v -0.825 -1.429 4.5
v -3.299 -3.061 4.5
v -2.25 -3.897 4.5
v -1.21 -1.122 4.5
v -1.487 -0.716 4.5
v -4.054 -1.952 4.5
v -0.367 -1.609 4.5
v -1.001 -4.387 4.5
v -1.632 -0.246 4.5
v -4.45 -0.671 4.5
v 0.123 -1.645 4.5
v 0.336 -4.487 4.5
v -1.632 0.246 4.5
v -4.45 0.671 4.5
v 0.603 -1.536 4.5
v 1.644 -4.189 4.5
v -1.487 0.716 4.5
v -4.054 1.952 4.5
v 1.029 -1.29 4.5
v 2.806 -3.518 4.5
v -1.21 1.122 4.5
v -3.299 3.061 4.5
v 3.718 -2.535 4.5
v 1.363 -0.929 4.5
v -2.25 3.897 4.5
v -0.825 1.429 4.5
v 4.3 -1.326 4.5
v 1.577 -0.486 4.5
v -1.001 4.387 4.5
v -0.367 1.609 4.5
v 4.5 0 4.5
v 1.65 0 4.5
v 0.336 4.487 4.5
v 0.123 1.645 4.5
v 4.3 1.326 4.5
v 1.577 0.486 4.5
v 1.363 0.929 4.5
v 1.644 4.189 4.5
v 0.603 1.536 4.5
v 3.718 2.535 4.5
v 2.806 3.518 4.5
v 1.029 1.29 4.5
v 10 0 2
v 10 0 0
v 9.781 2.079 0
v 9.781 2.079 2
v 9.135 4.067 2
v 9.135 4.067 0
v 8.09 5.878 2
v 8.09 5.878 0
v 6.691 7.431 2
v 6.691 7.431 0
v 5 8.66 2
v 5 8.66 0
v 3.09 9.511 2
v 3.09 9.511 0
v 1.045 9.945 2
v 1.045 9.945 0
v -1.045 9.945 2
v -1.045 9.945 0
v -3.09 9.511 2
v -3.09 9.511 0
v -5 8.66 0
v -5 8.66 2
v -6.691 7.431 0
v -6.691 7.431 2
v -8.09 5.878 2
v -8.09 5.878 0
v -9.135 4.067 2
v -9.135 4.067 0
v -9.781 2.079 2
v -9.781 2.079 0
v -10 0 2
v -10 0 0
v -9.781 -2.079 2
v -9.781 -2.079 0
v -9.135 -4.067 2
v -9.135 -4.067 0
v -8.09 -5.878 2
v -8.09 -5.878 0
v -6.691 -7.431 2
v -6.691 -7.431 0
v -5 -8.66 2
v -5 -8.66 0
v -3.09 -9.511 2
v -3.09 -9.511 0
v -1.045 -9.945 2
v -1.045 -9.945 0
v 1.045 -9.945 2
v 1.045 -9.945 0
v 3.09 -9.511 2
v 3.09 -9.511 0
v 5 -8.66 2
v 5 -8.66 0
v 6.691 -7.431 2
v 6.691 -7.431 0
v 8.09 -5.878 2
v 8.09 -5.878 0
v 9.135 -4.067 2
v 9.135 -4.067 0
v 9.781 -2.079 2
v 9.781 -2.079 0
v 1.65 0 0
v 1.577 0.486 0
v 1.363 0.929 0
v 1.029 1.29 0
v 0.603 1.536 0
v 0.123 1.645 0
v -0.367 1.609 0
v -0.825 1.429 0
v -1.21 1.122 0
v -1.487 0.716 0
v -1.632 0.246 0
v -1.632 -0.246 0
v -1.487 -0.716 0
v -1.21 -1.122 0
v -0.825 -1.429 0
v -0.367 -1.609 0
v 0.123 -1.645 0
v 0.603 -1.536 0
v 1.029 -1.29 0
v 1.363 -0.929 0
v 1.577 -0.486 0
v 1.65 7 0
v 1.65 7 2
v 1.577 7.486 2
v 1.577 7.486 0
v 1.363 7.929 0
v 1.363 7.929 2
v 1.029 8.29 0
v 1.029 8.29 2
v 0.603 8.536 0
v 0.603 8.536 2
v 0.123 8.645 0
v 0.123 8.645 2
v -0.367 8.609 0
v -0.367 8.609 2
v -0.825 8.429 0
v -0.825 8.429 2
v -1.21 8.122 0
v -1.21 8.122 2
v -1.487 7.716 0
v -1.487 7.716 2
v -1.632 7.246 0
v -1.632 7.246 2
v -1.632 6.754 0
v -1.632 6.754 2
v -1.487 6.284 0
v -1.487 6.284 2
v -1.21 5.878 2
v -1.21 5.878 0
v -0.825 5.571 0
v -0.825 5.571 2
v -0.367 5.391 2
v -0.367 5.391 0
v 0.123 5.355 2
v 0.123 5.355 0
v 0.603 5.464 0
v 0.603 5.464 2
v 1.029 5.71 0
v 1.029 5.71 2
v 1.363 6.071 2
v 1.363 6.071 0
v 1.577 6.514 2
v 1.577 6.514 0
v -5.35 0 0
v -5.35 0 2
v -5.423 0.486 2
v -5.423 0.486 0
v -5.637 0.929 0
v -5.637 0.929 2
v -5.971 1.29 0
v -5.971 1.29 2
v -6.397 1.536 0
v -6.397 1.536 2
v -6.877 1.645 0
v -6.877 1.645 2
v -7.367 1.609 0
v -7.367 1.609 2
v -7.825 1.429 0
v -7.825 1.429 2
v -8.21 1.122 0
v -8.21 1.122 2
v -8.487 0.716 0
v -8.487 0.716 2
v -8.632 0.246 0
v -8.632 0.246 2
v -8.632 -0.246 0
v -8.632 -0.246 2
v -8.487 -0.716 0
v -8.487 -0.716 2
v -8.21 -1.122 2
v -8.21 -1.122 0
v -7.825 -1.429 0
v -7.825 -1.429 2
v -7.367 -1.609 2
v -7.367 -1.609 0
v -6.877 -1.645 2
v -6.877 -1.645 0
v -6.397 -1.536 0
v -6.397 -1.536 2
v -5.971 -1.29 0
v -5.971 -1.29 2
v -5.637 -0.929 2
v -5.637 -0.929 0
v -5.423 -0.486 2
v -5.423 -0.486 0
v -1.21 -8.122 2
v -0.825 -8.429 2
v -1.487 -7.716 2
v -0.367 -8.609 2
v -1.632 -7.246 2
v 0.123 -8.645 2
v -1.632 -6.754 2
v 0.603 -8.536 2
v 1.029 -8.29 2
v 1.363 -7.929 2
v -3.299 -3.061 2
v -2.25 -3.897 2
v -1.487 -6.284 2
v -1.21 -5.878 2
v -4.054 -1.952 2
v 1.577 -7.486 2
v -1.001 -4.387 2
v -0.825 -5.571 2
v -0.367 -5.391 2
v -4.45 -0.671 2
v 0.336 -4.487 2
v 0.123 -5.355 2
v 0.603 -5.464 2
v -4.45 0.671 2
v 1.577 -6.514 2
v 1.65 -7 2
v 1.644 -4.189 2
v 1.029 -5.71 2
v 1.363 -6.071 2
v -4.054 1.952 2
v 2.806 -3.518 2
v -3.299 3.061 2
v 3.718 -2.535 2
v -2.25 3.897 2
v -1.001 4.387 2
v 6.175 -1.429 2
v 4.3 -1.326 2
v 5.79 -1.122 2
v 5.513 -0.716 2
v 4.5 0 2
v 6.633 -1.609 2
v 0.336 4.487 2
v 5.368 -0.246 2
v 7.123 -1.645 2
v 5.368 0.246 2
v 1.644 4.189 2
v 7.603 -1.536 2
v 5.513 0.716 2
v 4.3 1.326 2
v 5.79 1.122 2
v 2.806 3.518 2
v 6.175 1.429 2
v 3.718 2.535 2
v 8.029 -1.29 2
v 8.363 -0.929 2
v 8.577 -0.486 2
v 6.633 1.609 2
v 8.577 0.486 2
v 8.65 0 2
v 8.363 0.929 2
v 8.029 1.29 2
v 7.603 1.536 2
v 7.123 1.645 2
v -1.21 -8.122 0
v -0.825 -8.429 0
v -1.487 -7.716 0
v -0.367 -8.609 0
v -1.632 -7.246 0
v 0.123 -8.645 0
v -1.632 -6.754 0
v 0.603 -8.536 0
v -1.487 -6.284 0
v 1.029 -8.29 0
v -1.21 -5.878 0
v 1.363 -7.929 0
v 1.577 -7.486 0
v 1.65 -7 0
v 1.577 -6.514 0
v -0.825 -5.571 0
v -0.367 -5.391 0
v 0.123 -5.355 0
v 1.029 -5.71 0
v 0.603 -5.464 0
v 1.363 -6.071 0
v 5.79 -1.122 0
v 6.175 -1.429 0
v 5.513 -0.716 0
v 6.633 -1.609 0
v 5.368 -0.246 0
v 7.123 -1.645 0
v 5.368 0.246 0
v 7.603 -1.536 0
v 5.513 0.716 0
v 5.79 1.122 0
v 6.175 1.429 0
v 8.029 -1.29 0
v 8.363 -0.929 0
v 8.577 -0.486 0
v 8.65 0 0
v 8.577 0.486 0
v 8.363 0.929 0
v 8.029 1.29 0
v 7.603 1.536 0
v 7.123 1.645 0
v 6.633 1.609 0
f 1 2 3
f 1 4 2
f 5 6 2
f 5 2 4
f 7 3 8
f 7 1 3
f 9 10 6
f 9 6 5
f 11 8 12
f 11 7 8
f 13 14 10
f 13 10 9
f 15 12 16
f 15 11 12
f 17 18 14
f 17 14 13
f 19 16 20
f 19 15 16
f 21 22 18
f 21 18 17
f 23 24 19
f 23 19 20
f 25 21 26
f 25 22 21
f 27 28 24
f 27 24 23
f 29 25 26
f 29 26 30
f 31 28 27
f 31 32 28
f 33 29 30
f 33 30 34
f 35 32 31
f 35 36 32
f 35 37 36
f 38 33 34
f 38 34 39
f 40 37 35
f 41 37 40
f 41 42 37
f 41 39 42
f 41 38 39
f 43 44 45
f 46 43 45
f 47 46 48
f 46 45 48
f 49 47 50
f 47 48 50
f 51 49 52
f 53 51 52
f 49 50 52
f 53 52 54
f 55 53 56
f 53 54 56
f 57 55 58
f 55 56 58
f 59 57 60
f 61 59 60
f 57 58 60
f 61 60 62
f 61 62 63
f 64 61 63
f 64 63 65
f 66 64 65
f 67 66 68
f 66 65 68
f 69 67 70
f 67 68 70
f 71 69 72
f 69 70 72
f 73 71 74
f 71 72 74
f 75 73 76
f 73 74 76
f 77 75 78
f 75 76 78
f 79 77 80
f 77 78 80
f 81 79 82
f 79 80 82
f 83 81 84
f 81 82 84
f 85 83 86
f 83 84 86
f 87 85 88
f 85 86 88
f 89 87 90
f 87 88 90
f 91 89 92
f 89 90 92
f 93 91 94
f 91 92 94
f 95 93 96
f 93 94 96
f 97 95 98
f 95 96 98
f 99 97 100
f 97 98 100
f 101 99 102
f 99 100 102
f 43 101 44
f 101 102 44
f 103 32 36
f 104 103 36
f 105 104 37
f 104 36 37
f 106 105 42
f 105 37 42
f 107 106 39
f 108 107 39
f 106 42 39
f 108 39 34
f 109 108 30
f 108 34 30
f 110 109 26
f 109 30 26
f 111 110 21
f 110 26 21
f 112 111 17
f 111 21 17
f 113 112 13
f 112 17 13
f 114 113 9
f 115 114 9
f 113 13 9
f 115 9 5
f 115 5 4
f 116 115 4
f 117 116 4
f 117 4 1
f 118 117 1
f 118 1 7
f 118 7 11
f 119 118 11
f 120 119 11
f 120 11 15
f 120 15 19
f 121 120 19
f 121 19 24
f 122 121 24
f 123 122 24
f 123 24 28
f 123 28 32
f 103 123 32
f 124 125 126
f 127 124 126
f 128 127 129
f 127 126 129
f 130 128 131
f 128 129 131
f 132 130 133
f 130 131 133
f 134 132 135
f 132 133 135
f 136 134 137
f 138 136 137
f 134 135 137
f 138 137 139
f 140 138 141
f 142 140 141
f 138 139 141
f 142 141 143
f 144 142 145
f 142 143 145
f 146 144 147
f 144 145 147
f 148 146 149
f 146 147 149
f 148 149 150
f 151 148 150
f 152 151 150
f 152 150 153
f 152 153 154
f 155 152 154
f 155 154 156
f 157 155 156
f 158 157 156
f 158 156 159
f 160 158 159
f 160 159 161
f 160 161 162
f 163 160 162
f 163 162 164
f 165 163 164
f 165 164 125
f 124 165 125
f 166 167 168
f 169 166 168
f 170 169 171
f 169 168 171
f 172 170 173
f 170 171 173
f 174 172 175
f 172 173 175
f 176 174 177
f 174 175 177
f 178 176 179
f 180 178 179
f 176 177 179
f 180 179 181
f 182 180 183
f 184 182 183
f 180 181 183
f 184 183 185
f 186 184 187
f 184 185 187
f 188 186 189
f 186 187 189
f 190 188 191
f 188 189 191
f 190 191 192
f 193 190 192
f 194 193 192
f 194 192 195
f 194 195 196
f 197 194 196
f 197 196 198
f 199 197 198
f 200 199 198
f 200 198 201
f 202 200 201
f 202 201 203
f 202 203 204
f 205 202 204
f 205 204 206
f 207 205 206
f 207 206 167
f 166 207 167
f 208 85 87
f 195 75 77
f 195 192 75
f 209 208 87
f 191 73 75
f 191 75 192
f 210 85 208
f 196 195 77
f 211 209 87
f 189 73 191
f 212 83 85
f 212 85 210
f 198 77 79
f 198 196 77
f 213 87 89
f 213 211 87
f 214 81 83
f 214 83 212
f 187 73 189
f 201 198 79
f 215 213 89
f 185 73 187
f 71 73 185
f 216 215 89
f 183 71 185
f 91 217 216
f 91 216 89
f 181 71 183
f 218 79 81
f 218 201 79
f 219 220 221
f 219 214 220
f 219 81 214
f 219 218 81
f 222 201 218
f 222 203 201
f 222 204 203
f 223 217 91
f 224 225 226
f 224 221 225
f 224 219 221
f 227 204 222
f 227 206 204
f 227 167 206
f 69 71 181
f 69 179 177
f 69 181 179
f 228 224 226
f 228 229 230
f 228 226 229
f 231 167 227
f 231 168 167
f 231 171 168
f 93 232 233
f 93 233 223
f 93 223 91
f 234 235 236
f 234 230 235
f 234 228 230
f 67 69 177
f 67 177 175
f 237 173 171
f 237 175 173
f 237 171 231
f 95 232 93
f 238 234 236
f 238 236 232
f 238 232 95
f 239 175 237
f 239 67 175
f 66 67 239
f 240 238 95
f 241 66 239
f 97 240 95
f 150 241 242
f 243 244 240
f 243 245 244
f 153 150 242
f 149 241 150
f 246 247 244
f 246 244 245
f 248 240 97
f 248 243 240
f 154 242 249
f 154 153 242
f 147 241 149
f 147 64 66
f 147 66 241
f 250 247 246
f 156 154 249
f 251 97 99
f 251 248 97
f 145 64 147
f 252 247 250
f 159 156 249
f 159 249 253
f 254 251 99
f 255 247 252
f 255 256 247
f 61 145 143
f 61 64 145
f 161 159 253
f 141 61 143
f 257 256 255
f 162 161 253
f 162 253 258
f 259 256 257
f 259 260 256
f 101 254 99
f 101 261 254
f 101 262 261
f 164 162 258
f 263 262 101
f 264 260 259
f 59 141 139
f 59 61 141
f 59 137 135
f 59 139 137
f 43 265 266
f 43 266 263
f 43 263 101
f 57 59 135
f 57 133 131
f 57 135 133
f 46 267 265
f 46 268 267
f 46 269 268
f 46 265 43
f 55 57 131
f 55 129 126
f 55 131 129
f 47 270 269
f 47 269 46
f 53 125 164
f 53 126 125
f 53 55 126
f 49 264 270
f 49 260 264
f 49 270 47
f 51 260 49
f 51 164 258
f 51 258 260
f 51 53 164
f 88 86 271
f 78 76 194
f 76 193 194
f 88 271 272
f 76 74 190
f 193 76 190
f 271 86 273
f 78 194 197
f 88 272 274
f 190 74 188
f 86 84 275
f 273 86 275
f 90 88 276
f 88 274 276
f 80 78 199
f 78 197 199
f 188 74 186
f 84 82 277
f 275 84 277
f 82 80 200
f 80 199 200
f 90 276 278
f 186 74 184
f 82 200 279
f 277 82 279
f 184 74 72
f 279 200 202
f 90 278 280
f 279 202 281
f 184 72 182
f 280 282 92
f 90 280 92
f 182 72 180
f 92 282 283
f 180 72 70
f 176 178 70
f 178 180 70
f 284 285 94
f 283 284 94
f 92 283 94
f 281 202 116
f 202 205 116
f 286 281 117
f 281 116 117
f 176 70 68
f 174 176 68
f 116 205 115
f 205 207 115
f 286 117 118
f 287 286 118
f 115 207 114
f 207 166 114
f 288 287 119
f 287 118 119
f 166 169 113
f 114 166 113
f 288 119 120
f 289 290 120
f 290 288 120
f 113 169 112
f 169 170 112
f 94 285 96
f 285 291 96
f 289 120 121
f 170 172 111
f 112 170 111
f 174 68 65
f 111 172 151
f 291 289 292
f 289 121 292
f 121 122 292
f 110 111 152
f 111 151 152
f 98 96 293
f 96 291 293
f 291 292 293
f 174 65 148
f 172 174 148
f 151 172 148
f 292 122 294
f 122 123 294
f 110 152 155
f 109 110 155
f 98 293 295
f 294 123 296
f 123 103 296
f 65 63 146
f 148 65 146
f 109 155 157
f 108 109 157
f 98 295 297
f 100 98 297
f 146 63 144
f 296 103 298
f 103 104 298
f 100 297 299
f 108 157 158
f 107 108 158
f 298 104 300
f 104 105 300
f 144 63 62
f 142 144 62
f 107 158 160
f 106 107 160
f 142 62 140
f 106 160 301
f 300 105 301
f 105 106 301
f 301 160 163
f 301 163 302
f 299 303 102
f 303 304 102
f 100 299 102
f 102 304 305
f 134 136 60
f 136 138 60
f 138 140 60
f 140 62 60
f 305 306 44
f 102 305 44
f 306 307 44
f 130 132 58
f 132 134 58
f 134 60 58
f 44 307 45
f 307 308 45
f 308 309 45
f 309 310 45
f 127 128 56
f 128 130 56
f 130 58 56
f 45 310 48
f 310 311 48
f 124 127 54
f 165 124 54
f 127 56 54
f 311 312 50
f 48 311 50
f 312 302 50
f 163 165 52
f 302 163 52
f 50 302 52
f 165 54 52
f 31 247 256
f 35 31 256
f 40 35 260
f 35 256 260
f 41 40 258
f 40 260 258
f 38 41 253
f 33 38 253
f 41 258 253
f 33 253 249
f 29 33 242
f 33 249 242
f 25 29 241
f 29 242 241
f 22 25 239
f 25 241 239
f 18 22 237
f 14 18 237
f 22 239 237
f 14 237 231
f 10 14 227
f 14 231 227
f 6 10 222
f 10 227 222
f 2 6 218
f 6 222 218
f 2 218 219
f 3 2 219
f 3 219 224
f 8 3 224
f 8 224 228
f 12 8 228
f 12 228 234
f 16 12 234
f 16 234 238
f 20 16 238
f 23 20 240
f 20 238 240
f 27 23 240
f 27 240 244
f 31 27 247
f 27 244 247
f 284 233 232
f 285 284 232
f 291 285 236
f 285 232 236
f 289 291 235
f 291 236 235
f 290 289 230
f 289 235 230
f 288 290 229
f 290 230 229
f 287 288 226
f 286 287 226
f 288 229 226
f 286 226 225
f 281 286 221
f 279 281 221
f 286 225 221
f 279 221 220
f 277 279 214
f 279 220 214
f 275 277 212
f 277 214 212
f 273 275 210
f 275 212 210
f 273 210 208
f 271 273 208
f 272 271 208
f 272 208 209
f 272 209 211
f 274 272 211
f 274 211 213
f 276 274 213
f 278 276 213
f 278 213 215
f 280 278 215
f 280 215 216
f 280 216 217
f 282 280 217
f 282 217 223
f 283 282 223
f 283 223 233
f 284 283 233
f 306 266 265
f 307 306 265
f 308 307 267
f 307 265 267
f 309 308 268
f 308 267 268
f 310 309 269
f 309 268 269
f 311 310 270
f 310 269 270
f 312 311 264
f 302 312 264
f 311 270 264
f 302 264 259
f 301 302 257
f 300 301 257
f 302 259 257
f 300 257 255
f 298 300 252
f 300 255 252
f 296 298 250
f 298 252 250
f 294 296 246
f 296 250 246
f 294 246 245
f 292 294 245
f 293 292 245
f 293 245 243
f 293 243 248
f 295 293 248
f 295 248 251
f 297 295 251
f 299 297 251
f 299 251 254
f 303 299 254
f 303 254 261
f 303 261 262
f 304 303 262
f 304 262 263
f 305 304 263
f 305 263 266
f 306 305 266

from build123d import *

# Parameters (mm, degrees)
SKETCH_1_R          = 10
EXTRUDE_1_DEPTH     = 2
SKETCH_2_R          = 4.5
EXTRUDE_2_DEPTH     = 2.5
SKETCH_3_R          = 1.65
CUT_EXTRUDE_1_DEPTH = 8.5
SKETCH_4_R          = 1.65
CUT_EXTRUDE_2_DEPTH = 8.5


with BuildPart() as part:
    # 草图1 → 凸台-拉伸1 (new body)
    with BuildSketch(Plane.XY):
        Circle(SKETCH_1_R)
    extrude(amount=EXTRUDE_1_DEPTH)

    # 草图2 → 凸台-拉伸2 (add)
    with BuildSketch(Plane.XY.offset(2)):
        Circle(SKETCH_2_R)
    extrude(amount=EXTRUDE_2_DEPTH)

    # 草图3 → 切除-拉伸1 (cut)
    with BuildSketch(Plane.XY.offset(4.5)):
        Circle(SKETCH_3_R)
    extrude(amount=-CUT_EXTRUDE_1_DEPTH, mode=Mode.SUBTRACT)

    # 草图4 → 切除-拉伸2 (cut)
    with BuildSketch(Plane.XY.offset(2)):
        with Locations((0, 7)):
            Circle(SKETCH_4_R)
        with Locations((7, 0)):
            Circle(SKETCH_4_R)
        with Locations((0, -7)):
            Circle(SKETCH_4_R)
        with Locations((-7, 0)):
            Circle(SKETCH_4_R)
    extrude(amount=-CUT_EXTRUDE_2_DEPTH, mode=Mode.SUBTRACT)


solid = part.part
